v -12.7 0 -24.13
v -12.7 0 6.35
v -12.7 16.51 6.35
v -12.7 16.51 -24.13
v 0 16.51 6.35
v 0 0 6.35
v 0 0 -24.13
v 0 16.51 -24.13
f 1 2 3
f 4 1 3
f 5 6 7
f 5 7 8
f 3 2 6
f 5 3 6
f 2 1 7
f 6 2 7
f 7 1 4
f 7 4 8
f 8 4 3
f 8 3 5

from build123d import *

# Parameters (mm, degrees)
SKETCH1_W               = 12.7
SKETCH1_H               = 25.4
BOSS_EXTRUDE1_DEPTH     = 16.51
SKETCH2_W               = 12.7
SKETCH2_H               = 16.51
BOSS_EXTRUDE2_DEPTH     = 6.35
CUT_EXTRUDE2_DEPTH      = 33.848593577
CUT_EXTRUDE2_DEPTH_BACK = 33.848593577


with BuildPart() as part:
    # Sketch1 → Boss-Extrude1 (new body)
    with BuildSketch(Plane(origin=(0, 0, 0), x_dir=(1, 0, 0), z_dir=(0, 1, 0))):
        with Locations((-6.35, 12.7)):
            Rectangle(SKETCH1_W, SKETCH1_H)
    extrude(amount=BOSS_EXTRUDE1_DEPTH)

    # Sketch2 → Boss-Extrude2 (add)
    with BuildSketch(Plane.XY):
        with Locations((-6.35, 8.255)):
            Rectangle(SKETCH2_W, SKETCH2_H)
    extrude(amount=BOSS_EXTRUDE2_DEPTH)

    # Sketch10 → Cut-Extrude2 (cut, two sides: drawn at the far end of the back side and taken through both)
    with BuildSketch(Plane(origin=(0, 16.51, 0), x_dir=(1, 0, 0), z_dir=(0, 1, 0)).offset(-CUT_EXTRUDE2_DEPTH_BACK)):
        Polygon((-89.832793046, 24.13), (-13.312237672, 24.13), (0.540702774, 24.13), (77.061258148, 24.13), (77.061258148, 177.171110749), (-89.832793046, 177.171110749), align=None)
    extrude(amount=CUT_EXTRUDE2_DEPTH + CUT_EXTRUDE2_DEPTH_BACK, mode=Mode.SUBTRACT)


solid = part.part
